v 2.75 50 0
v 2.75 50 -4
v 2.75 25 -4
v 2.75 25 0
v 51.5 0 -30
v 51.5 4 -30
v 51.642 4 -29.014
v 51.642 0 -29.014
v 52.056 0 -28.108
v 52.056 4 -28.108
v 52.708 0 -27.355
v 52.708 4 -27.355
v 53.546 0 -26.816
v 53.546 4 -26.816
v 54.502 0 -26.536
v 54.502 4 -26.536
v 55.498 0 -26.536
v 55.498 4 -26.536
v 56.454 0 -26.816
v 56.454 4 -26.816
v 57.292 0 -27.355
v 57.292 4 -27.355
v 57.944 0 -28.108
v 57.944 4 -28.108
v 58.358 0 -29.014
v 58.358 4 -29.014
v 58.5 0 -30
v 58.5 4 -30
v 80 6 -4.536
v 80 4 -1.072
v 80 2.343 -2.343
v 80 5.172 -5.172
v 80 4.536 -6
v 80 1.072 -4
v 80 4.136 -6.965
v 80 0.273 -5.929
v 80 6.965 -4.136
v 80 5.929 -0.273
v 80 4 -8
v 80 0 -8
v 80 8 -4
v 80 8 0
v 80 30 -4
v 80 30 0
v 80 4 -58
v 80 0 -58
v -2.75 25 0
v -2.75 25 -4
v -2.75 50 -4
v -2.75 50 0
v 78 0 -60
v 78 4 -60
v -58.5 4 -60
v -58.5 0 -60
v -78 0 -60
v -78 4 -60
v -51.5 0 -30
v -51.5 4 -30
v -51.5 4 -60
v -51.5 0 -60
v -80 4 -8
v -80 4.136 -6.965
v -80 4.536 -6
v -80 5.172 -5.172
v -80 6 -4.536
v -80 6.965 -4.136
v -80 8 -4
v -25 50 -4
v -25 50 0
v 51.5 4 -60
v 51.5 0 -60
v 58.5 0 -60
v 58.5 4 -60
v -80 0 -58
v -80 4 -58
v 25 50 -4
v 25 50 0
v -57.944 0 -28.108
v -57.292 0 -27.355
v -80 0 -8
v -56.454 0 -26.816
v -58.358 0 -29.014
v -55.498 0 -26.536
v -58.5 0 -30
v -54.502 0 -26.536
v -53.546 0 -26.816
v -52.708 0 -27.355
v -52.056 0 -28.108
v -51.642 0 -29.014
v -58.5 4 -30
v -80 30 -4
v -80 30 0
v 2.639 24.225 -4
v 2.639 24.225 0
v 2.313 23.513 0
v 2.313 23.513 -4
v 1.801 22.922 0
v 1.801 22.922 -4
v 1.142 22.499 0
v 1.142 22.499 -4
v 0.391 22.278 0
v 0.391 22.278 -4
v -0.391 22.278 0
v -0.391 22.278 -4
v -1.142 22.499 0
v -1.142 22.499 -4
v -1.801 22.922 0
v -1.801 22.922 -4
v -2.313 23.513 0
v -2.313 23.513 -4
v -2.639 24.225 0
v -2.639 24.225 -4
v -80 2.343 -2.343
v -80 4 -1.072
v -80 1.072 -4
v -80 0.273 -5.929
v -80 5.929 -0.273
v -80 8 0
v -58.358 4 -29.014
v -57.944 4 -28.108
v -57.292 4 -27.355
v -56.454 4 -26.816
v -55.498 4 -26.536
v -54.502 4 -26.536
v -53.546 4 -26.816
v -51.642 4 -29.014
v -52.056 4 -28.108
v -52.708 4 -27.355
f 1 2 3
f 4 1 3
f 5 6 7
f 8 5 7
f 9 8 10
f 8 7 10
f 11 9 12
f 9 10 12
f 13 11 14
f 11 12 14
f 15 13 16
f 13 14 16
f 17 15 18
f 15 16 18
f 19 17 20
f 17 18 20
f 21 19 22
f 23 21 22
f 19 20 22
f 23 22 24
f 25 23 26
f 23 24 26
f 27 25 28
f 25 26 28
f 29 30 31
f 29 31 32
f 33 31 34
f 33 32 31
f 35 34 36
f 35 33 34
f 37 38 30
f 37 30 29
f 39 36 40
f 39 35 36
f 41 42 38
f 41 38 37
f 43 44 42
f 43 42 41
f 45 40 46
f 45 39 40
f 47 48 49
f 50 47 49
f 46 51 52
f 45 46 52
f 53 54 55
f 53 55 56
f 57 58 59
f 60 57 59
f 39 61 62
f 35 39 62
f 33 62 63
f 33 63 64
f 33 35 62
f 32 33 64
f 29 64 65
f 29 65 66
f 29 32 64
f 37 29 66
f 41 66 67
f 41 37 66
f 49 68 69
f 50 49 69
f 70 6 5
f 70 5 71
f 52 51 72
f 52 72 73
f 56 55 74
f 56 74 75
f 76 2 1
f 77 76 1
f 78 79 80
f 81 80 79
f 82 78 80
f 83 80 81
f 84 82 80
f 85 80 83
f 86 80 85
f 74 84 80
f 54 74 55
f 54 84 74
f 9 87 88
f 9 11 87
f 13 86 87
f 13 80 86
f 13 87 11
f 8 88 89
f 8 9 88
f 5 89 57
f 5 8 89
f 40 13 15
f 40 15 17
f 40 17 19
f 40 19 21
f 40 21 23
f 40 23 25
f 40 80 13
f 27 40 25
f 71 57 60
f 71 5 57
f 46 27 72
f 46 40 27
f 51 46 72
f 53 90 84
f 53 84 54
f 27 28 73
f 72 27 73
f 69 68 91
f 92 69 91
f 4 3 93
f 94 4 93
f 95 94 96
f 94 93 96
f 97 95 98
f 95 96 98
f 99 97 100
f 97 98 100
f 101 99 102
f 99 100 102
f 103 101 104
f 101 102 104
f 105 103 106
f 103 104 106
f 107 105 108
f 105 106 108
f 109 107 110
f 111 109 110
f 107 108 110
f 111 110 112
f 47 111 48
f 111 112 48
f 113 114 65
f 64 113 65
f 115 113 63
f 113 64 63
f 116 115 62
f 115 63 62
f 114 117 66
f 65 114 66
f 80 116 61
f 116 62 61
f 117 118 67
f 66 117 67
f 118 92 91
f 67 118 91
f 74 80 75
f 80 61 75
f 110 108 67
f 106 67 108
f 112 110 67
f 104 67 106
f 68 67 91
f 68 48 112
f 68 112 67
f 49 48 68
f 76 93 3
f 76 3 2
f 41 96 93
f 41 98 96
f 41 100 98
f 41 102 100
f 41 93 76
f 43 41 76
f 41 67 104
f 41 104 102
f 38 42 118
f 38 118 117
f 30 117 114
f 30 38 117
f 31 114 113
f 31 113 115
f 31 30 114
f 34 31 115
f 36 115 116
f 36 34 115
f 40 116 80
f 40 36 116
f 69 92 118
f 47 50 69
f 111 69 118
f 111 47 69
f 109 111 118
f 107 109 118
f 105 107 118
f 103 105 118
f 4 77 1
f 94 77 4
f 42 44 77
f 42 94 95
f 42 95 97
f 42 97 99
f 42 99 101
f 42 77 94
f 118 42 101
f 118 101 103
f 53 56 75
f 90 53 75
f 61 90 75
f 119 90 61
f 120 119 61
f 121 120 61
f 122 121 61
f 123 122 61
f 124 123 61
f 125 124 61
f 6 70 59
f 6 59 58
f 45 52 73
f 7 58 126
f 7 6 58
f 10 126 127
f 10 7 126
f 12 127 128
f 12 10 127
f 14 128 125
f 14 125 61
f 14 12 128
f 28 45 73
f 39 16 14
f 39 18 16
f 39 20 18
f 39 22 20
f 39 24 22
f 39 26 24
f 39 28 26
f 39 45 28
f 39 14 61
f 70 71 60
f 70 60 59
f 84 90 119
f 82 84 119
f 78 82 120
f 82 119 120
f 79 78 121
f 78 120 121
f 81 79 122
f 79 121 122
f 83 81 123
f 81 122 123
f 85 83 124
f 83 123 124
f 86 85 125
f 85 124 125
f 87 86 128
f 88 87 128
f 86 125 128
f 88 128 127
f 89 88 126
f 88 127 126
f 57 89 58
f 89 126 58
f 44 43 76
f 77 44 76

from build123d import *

# Parameters (mm, degrees)
BASE_FLANGE1_DEPTH = 80
CUT_EXTRUDE1_DEPTH = 110.708705215
SKETCH8_R          = 3.5
SKETCH8_W          = 7
SKETCH8_H          = 60
CUT_EXTRUDE2_DEPTH = 111.072703247
CHAMFER1_SIZE      = 2


# Sheet-metal steps are written as plain solids
with BuildPart() as part:
    # Sketch1 → Base-Flange1 (new, symmetric)
    with BuildSketch(Plane(origin=(0, 0, 0), x_dir=(0, 0, -1), z_dir=(1, 0, 0))):
        with BuildLine():
            Line((0, 50), (0, 8))
            ThreePointArc((0, 8), (2.343145751, 2.343145751), (8, 0))
            Line((8, 0), (60, 0))
            Line((60, 0), (60, 4))
            Line((60, 4), (8, 4))
            ThreePointArc((8, 4), (5.171572875, 5.171572875), (4, 8))
            Line((4, 8), (4, 50))
            Line((4, 50), (0, 50))
        make_face()
    extrude(amount=BASE_FLANGE1_DEPTH, both=True)

    # Sketch7 → Cut-Extrude1 (cut, through all)
    with BuildSketch(Plane(origin=(0, 0, -4), x_dir=(-1, 0, 0), z_dir=(0, 0, -1))):
        with BuildLine():
            Line((2.75, 50), (-2.75, 50))
            Line((-2.75, 50), (-2.75, 25))
            ThreePointArc((-2.75, 25), (0, 27.75), (2.75, 25))
            Line((2.75, 25), (2.75, 50))
        make_face()
        with BuildLine():
            ThreePointArc((2.75, 25), (0, 27.75), (-2.75, 25))
            Line((-2.75, 25), (2.75, 25))
        make_face()
        with BuildLine():
            Line((2.75, 25), (-2.75, 25))
            ThreePointArc((-2.75, 25), (0, 22.25), (2.75, 25))
        make_face()
        Polygon((-80, 30), (-25, 50), (-80, 50), align=None)
        Polygon((80, 50), (25, 50), (80, 30), align=None)
    extrude(amount=-CUT_EXTRUDE1_DEPTH, mode=Mode.SUBTRACT)

    # Sketch8 → Cut-Extrude2 (cut, through all)
    with BuildSketch(Plane(origin=(0, 4, 0), x_dir=(1, 0, 0), z_dir=(0, 1, 0))):
        with Locations((-55, 30)):
            Circle(SKETCH8_R)
        with Locations((55, 30)):
            Circle(SKETCH8_R)
        with Locations((-55, 60)):
            Rectangle(SKETCH8_W, SKETCH8_H)
        with Locations((55, 60)):
            Rectangle(SKETCH8_W, SKETCH8_H)
    extrude(amount=-CUT_EXTRUDE2_DEPTH, mode=Mode.SUBTRACT)

    # Chamfer1
    chamfer1_edges = [part.edges().sort_by_distance(p)[0] for p in [
        (80, 2, -60),
        (-80, 2, -60),
    ]]
    chamfer(chamfer1_edges, length=CHAMFER1_SIZE)


solid = part.part
